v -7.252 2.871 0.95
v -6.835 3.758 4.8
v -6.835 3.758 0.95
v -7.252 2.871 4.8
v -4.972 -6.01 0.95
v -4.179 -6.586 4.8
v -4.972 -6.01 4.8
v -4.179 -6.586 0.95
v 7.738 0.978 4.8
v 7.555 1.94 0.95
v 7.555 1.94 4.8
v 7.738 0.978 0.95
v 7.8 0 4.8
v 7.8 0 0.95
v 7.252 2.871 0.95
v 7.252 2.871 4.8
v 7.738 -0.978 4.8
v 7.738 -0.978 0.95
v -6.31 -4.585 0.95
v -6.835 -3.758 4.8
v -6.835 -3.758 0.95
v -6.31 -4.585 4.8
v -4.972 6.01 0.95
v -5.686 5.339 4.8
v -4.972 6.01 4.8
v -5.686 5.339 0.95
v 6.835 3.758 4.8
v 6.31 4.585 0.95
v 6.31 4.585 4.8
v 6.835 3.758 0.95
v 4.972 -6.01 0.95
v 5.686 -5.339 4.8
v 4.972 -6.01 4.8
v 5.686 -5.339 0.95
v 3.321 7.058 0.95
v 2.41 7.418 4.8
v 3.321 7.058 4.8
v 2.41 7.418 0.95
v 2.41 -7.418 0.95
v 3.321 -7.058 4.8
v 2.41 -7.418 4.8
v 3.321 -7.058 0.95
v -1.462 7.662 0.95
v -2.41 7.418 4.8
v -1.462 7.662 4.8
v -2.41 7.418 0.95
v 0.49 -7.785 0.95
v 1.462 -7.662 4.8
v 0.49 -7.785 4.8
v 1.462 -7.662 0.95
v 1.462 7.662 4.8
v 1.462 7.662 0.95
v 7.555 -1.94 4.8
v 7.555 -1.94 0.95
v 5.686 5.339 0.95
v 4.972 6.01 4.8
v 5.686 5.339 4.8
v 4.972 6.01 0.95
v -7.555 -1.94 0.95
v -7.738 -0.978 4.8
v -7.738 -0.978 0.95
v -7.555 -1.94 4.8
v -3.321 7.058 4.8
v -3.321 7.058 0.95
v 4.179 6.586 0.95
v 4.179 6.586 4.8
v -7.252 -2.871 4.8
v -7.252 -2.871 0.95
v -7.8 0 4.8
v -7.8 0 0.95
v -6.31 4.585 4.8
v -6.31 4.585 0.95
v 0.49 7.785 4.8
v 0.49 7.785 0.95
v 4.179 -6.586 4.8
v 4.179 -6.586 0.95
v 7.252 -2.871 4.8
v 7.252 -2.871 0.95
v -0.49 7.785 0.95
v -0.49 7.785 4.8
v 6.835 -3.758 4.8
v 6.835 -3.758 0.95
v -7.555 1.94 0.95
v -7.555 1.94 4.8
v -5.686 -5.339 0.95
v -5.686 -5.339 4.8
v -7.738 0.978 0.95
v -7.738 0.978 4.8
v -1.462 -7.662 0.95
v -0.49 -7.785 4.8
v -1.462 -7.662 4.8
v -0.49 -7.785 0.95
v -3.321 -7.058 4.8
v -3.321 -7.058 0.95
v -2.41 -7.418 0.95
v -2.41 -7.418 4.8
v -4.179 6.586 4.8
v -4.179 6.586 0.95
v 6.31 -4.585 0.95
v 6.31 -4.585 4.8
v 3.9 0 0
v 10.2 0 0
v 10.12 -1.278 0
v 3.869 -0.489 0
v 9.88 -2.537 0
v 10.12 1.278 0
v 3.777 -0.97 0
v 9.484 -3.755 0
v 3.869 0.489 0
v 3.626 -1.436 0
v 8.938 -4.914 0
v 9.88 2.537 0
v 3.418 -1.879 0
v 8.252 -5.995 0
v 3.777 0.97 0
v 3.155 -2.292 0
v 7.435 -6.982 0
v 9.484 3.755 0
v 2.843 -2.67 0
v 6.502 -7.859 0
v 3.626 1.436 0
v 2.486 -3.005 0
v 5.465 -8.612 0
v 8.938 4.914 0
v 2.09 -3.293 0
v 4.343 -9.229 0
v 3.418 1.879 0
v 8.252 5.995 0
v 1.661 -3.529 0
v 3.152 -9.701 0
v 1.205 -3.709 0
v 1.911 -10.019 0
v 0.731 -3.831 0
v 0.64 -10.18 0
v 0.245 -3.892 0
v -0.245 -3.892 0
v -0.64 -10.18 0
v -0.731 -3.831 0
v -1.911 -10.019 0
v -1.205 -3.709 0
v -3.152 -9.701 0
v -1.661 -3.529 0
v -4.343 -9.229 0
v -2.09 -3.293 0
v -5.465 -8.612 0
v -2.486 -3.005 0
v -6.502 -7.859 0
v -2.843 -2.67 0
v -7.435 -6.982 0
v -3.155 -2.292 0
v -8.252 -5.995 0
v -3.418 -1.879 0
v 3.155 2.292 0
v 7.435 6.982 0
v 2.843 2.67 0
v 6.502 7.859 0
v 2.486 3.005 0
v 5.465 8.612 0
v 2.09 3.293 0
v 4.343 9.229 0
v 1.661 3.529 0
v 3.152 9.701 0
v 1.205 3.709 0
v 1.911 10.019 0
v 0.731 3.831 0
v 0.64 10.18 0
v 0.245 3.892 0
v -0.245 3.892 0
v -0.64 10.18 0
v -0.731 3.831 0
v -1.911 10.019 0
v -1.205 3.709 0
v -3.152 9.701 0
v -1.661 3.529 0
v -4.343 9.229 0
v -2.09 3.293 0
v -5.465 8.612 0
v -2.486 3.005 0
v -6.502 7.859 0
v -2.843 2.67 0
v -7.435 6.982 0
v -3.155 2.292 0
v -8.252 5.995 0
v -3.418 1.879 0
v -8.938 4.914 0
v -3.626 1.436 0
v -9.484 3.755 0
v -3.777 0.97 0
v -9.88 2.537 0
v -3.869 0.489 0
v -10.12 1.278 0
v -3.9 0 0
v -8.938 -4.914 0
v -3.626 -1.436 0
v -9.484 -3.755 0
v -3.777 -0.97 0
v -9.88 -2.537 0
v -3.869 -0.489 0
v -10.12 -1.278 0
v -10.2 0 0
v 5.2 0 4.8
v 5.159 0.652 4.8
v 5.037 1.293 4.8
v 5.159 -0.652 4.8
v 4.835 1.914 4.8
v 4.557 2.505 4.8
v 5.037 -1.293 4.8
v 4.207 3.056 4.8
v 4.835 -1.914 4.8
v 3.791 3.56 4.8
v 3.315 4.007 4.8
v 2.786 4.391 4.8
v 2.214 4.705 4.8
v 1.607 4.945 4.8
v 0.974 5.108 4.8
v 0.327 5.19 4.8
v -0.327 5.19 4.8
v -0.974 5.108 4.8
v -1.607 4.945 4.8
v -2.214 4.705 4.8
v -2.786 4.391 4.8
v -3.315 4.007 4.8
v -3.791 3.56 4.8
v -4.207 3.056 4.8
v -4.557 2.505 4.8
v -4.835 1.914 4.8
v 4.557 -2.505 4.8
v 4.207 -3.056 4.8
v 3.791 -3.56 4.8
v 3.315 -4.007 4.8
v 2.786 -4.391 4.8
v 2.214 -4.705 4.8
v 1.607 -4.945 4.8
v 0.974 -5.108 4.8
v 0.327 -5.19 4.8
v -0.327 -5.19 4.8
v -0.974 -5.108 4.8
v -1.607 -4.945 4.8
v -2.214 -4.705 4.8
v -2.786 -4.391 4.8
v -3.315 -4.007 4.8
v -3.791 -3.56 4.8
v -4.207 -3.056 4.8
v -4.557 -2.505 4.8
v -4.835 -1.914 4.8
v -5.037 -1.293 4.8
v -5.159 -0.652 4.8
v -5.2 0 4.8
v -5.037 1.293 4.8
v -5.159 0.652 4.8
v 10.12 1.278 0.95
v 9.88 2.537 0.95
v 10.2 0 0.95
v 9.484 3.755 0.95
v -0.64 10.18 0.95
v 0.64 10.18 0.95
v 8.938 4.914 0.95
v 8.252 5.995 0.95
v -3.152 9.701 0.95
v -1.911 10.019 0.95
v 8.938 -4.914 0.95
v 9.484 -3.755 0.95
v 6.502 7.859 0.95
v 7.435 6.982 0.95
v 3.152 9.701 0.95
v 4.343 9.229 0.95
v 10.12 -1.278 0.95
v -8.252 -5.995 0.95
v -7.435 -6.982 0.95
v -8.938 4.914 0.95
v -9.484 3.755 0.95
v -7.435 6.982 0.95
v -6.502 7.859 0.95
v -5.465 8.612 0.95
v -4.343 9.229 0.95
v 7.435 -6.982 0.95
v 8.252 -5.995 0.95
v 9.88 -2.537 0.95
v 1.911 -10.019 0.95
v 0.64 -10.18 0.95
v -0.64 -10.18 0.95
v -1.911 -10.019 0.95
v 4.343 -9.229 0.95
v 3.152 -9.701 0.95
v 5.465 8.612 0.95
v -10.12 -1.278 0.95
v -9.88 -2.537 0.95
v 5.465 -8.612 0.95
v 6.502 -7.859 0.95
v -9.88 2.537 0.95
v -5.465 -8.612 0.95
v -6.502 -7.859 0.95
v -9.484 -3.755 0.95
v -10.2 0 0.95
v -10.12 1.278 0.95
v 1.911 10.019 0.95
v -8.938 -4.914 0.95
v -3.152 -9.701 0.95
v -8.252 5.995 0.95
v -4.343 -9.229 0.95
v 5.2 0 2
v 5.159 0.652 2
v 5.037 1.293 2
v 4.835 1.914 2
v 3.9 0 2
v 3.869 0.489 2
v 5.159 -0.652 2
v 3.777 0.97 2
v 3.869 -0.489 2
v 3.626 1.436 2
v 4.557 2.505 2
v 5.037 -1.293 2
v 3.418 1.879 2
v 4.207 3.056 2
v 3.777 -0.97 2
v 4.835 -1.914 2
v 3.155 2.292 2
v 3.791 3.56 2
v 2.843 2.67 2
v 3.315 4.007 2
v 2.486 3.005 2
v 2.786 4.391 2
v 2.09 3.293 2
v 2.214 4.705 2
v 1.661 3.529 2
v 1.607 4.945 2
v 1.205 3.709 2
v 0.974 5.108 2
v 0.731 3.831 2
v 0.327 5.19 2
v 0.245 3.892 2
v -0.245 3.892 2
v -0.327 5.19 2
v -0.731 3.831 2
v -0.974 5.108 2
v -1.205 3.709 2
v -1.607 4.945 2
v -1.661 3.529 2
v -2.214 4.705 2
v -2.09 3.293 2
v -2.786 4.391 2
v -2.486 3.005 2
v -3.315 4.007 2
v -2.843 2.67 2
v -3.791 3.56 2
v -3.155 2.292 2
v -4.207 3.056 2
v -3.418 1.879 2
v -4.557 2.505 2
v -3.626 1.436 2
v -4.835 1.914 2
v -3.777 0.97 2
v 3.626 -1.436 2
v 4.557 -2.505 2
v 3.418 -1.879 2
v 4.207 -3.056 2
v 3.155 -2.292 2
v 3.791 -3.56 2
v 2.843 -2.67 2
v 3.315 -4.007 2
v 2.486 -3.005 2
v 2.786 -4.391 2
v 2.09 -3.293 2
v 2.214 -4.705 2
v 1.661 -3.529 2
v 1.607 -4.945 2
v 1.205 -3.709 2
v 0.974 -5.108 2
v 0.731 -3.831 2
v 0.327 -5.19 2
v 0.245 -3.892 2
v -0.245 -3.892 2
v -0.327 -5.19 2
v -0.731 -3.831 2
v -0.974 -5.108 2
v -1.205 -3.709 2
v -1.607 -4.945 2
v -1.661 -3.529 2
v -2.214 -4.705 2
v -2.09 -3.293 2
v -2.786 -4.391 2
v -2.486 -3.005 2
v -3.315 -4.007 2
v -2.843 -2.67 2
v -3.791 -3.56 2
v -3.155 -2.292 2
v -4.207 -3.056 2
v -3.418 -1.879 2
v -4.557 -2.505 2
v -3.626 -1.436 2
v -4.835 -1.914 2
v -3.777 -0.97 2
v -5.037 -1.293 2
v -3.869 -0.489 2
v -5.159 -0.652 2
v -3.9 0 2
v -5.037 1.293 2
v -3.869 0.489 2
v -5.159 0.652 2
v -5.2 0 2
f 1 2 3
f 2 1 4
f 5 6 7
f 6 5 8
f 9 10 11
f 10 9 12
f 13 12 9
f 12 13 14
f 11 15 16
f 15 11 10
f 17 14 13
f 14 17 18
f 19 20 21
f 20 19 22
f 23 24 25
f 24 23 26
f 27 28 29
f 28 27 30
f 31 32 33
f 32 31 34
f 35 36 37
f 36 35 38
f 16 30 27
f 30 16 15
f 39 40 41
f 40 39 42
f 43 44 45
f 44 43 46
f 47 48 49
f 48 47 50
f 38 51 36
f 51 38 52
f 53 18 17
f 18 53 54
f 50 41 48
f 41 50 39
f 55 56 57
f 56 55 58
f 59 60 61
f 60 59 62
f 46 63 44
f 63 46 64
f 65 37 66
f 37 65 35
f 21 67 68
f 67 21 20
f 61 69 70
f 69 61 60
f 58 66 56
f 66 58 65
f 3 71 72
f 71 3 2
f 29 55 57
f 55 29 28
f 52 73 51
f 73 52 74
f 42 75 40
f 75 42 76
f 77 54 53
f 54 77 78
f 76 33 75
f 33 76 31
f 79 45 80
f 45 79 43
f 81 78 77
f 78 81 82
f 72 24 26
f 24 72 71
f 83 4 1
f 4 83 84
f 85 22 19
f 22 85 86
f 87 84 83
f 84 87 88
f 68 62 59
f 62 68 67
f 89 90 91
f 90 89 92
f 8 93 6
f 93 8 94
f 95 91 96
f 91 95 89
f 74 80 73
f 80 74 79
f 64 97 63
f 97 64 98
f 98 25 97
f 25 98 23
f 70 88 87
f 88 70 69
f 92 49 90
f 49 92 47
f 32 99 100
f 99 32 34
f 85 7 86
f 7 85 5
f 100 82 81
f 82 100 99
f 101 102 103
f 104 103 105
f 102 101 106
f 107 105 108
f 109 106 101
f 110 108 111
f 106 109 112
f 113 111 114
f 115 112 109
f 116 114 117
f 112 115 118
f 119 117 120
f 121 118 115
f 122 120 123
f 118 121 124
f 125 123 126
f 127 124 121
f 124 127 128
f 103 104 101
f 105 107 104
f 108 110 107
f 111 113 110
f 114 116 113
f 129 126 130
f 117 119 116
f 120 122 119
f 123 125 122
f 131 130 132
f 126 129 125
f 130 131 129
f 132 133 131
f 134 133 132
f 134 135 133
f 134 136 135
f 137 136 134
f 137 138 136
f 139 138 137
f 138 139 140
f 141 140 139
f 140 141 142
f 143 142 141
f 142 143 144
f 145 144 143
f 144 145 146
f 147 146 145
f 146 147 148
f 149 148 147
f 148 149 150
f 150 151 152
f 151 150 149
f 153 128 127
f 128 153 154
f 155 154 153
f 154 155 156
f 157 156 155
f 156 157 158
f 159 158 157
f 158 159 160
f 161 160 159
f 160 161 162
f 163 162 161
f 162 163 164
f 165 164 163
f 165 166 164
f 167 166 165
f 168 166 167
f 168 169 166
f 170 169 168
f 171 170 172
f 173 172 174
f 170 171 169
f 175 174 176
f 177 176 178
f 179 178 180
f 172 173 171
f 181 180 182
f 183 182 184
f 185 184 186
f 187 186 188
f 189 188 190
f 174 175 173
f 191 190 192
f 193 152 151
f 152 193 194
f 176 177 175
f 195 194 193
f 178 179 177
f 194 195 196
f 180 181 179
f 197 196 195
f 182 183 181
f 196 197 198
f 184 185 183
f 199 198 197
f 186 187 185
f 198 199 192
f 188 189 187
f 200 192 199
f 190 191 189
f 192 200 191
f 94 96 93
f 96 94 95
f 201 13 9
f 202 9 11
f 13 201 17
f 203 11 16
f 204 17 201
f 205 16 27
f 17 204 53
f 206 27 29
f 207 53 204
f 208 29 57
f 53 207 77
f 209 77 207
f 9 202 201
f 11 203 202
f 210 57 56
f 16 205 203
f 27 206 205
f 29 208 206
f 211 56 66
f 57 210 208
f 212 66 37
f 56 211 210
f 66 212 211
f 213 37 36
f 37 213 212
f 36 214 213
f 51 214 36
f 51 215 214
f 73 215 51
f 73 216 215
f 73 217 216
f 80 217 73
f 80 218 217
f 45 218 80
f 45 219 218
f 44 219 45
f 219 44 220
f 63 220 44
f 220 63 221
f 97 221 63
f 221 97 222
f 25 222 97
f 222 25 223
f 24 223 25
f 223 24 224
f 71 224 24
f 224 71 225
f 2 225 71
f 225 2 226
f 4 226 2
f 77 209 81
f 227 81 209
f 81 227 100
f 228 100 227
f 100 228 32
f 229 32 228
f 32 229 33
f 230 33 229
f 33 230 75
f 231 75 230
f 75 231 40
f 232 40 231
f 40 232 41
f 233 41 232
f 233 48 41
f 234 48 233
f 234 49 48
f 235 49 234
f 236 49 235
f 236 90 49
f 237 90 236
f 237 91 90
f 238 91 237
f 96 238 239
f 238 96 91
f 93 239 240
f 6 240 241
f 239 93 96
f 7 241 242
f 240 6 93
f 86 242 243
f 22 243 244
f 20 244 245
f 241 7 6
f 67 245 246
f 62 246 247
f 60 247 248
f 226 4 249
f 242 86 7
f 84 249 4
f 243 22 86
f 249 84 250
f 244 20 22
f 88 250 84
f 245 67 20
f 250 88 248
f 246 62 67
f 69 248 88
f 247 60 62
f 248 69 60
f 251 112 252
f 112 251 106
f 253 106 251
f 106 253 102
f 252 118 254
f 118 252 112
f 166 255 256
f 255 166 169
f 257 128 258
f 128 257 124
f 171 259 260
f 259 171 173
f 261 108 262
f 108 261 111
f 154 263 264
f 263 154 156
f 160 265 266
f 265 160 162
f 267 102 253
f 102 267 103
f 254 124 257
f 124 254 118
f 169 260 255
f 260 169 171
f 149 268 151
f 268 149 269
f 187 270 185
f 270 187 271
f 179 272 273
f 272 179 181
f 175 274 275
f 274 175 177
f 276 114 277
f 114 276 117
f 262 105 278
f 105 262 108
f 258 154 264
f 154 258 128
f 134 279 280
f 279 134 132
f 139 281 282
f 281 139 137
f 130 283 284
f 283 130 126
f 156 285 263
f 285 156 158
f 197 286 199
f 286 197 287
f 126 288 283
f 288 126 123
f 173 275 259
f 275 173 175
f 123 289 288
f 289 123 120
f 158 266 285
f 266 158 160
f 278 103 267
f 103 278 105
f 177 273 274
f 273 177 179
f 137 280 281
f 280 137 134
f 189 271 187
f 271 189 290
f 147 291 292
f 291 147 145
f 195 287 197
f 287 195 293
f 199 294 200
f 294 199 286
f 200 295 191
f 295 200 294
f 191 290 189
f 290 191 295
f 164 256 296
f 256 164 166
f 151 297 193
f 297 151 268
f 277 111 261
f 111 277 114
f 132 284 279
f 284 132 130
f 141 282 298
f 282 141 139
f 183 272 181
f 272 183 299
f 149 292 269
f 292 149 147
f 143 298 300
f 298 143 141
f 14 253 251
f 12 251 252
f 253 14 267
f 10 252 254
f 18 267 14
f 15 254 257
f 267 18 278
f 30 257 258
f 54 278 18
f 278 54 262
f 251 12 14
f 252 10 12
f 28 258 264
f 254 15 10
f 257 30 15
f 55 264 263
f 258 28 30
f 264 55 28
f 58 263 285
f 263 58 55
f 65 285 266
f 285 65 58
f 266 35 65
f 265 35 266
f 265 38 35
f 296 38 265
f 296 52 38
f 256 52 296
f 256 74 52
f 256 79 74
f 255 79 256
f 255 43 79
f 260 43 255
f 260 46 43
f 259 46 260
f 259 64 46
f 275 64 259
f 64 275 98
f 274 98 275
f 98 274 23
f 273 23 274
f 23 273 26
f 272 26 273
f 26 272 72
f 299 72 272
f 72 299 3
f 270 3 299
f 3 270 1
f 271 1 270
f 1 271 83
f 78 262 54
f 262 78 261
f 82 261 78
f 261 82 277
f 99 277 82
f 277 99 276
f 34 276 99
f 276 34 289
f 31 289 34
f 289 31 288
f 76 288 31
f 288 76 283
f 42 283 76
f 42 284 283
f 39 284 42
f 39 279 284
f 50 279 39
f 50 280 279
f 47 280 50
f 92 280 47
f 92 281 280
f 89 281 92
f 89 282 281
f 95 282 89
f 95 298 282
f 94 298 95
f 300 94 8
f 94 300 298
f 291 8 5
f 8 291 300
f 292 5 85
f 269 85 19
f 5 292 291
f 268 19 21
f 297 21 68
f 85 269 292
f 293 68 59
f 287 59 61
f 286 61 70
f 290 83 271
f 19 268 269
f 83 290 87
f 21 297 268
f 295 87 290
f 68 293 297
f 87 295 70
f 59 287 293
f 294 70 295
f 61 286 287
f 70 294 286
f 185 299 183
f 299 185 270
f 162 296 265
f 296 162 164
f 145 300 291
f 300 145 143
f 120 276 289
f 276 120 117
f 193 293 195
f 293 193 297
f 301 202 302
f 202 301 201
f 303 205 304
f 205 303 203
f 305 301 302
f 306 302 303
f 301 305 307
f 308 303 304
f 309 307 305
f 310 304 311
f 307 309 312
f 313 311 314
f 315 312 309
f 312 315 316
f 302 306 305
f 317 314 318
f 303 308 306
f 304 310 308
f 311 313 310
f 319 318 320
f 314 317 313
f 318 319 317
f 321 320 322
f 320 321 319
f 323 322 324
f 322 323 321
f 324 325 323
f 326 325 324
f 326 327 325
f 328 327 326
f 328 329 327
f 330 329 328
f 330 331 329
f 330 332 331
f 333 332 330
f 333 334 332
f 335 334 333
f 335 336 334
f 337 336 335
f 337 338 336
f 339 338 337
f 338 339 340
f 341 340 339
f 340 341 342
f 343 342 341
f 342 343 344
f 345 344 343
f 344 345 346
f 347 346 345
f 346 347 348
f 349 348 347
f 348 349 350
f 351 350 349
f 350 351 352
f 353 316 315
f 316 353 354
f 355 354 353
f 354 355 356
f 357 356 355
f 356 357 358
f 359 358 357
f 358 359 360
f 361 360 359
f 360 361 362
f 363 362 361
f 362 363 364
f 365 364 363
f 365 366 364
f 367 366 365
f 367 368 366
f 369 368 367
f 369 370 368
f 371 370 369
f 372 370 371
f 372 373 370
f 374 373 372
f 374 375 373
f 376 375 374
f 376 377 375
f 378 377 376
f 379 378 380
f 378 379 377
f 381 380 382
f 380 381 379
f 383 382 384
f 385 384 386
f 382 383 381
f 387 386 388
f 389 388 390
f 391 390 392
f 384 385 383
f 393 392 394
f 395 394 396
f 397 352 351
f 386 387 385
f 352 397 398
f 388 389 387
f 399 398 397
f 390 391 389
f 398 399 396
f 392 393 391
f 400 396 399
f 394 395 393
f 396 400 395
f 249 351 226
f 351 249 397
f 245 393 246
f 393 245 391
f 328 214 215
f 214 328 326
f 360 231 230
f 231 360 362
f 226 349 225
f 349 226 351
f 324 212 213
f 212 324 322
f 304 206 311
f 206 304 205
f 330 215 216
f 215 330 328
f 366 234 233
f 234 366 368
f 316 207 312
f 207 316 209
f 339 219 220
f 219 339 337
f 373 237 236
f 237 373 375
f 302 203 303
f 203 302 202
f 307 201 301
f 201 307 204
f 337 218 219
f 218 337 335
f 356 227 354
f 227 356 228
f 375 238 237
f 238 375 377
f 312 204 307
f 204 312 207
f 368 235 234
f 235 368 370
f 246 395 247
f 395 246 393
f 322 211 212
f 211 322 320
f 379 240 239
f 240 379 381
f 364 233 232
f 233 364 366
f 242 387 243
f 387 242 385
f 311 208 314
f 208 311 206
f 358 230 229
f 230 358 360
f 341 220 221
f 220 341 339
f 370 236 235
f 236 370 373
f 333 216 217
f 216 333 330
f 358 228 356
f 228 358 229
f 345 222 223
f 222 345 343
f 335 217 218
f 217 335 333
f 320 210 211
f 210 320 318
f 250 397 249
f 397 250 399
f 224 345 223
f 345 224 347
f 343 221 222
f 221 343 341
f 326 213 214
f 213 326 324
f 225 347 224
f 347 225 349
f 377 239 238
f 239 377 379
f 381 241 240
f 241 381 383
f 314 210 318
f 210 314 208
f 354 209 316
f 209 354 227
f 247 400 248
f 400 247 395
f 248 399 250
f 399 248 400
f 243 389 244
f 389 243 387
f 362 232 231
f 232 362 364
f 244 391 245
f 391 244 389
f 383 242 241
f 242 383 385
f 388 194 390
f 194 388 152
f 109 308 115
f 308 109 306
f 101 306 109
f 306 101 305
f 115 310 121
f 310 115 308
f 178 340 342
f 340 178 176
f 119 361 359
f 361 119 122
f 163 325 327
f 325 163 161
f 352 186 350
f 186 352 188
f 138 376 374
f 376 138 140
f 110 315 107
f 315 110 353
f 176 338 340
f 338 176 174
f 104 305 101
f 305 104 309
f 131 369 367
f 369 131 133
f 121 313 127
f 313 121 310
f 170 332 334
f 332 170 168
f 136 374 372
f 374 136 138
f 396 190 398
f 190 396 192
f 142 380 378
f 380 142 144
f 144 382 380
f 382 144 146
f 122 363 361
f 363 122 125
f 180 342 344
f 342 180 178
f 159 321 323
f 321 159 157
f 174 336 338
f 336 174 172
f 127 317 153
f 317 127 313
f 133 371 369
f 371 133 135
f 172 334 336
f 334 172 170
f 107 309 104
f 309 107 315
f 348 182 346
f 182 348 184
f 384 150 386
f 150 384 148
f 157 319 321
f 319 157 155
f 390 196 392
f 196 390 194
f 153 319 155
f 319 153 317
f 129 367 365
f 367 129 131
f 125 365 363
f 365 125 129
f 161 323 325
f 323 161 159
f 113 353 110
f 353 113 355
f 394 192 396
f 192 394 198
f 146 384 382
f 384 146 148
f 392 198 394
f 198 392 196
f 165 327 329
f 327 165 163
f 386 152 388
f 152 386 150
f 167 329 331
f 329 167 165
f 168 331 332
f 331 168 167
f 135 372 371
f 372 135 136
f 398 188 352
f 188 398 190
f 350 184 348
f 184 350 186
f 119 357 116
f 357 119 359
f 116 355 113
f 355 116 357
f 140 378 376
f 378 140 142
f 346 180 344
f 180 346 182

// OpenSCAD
// PRUSA iteration3
// 624 bearing belt guide
// GNU GPL v3
// Josef Průša <iam@josefprusa.cz> and contributors
// http://www.reprap.org/wiki/Prusa_Mendel
// http://prusamendel.org

wall= 1.2;
clearence= 0.1; 

module belt_guide_base(){
 cylinder(r=6.5+wall+clearence, h=5-0.2, $fn=50);
 cylinder(r=6.5+wall+clearence+2*wall, h=0.95, $fn=50);
}

module belt_guide_holes(){
 // Bearing fits here - 5.2mm radius
 translate([0,0,2]) cylinder(r=5.1+clearence, h=10, $fn=50);
 
 // Through-hole for the axis
 // r = 3.9
 translate([0,0,-1]) cylinder(r=5+wall+clearence-2*wall, h=10, $fn=50);
}

// Final part
module belt_guide(){
 difference(){
  belt_guide_base();
  belt_guide_holes();
 }
}

belt_guide();
